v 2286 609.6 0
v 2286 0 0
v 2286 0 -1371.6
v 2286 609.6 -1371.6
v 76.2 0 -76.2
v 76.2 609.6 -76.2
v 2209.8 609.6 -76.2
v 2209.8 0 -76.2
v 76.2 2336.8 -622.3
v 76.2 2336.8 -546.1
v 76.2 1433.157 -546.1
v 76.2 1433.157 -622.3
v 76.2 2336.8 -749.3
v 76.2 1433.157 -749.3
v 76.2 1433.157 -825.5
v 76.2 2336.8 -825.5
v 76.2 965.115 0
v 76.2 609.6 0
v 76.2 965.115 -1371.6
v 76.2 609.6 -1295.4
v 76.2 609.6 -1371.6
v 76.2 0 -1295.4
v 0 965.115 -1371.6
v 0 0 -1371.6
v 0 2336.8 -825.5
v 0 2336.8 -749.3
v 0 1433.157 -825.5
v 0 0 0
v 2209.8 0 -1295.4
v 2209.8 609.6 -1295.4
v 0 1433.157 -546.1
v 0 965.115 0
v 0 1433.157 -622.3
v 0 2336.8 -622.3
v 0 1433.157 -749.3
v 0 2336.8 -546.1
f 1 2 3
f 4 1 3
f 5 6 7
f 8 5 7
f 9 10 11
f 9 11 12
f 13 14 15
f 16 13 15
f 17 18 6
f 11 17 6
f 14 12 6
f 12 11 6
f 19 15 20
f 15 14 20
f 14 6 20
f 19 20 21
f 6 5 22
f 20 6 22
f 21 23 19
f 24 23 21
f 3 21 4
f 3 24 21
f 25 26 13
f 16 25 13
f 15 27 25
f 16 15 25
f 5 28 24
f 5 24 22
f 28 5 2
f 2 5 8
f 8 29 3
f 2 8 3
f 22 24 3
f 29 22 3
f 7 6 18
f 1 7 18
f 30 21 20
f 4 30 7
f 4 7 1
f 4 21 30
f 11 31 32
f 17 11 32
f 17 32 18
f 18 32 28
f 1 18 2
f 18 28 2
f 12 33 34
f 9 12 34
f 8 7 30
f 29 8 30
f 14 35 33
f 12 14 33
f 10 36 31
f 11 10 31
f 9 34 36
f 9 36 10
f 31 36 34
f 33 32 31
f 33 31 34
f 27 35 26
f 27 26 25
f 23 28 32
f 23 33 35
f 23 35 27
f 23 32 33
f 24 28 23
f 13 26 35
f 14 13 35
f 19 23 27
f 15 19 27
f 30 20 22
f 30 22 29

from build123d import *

# Parameters (mm, degrees)
SKETCH1_W               = 2286
SKETCH1_H               = 1371.6
BOSS_EXTRUDE1_DEPTH     = 609.6
SKETCH2_W               = 2133.6
SKETCH2_H               = 1219.2
CUT_EXTRUDE1_DEPTH      = 609.6
SKETCH3_W               = 76.2
SKETCH3_H               = 1371.6
BOSS_EXTRUDE3_DEPTH     = 1727.2
CUT_EXTRUDE2_DEPTH      = 1
CUT_EXTRUDE2_DEPTH_BACK = 1727.2
CUT_EXTRUDE3_DEPTH      = 1
CUT_EXTRUDE3_DEPTH_BACK = 1727.2


with BuildPart() as part:
    # Sketch1 → Boss-Extrude1 (new body)
    with BuildSketch(Plane(origin=(0, 0, 0), x_dir=(1, 0, 0), z_dir=(0, 1, 0))):
        with Locations((1143, 685.8)):
            Rectangle(SKETCH1_W, SKETCH1_H)
    extrude(amount=BOSS_EXTRUDE1_DEPTH)

    # Sketch2 → Cut-Extrude1 (cut)
    with BuildSketch(Plane(origin=(0, 609.6, 0), x_dir=(1, 0, 0), z_dir=(0, 1, 0))):
        with Locations((1143, 685.8)):
            Rectangle(SKETCH2_W, SKETCH2_H)
    extrude(amount=-CUT_EXTRUDE1_DEPTH, mode=Mode.SUBTRACT)

    # Sketch3 → Boss-Extrude3 (add)
    with BuildSketch(Plane(origin=(0, 609.6, 0), x_dir=(1, 0, 0), z_dir=(0, 1, 0))):
        with Locations((38.1, 685.8)):
            Rectangle(SKETCH3_W, SKETCH3_H)
    extrude(amount=BOSS_EXTRUDE3_DEPTH)

    # Sketch4 → Cut-Extrude2 (cut, two sides)
    with BuildSketch(Plane.ZY) as cut_extrude2_sk:
        Polygon((-5142.706542047, -2266.9631031), (-1371.6, 965.114607179), (-825.5, 1433.15697562), (-825.5, 2336.8), (-825.5, 7303.445837661), (-9880.152979292, 11387.995131231), (-14197.359521339, 1817.58619047), align=None)
    extrude(amount=CUT_EXTRUDE2_DEPTH, mode=Mode.SUBTRACT)
    extrude(cut_extrude2_sk.sketch, amount=-CUT_EXTRUDE2_DEPTH_BACK, mode=Mode.SUBTRACT)

    # Sketch5 → Cut-Extrude3 (cut, two sides)
    with BuildSketch(Plane.ZY) as cut_extrude3_sk:
        Polygon((-5792.145837661, 2336.8), (-825.5, 2336.8), (-749.3, 2336.8), (-749.3, 1433.15697562), (-622.3, 1433.15697562), (-622.3, 2336.8), (-546.1, 2336.8), (-546.1, 1433.15697562), (0, 965.114607179), (3771.106542047, -2266.9631031), (8079.741765722, 6683.229409707), (-1483.510613985, 11286.992512807), align=None)
    extrude(amount=CUT_EXTRUDE3_DEPTH, mode=Mode.SUBTRACT)
    extrude(cut_extrude3_sk.sketch, amount=-CUT_EXTRUDE3_DEPTH_BACK, mode=Mode.SUBTRACT)


solid = part.part
